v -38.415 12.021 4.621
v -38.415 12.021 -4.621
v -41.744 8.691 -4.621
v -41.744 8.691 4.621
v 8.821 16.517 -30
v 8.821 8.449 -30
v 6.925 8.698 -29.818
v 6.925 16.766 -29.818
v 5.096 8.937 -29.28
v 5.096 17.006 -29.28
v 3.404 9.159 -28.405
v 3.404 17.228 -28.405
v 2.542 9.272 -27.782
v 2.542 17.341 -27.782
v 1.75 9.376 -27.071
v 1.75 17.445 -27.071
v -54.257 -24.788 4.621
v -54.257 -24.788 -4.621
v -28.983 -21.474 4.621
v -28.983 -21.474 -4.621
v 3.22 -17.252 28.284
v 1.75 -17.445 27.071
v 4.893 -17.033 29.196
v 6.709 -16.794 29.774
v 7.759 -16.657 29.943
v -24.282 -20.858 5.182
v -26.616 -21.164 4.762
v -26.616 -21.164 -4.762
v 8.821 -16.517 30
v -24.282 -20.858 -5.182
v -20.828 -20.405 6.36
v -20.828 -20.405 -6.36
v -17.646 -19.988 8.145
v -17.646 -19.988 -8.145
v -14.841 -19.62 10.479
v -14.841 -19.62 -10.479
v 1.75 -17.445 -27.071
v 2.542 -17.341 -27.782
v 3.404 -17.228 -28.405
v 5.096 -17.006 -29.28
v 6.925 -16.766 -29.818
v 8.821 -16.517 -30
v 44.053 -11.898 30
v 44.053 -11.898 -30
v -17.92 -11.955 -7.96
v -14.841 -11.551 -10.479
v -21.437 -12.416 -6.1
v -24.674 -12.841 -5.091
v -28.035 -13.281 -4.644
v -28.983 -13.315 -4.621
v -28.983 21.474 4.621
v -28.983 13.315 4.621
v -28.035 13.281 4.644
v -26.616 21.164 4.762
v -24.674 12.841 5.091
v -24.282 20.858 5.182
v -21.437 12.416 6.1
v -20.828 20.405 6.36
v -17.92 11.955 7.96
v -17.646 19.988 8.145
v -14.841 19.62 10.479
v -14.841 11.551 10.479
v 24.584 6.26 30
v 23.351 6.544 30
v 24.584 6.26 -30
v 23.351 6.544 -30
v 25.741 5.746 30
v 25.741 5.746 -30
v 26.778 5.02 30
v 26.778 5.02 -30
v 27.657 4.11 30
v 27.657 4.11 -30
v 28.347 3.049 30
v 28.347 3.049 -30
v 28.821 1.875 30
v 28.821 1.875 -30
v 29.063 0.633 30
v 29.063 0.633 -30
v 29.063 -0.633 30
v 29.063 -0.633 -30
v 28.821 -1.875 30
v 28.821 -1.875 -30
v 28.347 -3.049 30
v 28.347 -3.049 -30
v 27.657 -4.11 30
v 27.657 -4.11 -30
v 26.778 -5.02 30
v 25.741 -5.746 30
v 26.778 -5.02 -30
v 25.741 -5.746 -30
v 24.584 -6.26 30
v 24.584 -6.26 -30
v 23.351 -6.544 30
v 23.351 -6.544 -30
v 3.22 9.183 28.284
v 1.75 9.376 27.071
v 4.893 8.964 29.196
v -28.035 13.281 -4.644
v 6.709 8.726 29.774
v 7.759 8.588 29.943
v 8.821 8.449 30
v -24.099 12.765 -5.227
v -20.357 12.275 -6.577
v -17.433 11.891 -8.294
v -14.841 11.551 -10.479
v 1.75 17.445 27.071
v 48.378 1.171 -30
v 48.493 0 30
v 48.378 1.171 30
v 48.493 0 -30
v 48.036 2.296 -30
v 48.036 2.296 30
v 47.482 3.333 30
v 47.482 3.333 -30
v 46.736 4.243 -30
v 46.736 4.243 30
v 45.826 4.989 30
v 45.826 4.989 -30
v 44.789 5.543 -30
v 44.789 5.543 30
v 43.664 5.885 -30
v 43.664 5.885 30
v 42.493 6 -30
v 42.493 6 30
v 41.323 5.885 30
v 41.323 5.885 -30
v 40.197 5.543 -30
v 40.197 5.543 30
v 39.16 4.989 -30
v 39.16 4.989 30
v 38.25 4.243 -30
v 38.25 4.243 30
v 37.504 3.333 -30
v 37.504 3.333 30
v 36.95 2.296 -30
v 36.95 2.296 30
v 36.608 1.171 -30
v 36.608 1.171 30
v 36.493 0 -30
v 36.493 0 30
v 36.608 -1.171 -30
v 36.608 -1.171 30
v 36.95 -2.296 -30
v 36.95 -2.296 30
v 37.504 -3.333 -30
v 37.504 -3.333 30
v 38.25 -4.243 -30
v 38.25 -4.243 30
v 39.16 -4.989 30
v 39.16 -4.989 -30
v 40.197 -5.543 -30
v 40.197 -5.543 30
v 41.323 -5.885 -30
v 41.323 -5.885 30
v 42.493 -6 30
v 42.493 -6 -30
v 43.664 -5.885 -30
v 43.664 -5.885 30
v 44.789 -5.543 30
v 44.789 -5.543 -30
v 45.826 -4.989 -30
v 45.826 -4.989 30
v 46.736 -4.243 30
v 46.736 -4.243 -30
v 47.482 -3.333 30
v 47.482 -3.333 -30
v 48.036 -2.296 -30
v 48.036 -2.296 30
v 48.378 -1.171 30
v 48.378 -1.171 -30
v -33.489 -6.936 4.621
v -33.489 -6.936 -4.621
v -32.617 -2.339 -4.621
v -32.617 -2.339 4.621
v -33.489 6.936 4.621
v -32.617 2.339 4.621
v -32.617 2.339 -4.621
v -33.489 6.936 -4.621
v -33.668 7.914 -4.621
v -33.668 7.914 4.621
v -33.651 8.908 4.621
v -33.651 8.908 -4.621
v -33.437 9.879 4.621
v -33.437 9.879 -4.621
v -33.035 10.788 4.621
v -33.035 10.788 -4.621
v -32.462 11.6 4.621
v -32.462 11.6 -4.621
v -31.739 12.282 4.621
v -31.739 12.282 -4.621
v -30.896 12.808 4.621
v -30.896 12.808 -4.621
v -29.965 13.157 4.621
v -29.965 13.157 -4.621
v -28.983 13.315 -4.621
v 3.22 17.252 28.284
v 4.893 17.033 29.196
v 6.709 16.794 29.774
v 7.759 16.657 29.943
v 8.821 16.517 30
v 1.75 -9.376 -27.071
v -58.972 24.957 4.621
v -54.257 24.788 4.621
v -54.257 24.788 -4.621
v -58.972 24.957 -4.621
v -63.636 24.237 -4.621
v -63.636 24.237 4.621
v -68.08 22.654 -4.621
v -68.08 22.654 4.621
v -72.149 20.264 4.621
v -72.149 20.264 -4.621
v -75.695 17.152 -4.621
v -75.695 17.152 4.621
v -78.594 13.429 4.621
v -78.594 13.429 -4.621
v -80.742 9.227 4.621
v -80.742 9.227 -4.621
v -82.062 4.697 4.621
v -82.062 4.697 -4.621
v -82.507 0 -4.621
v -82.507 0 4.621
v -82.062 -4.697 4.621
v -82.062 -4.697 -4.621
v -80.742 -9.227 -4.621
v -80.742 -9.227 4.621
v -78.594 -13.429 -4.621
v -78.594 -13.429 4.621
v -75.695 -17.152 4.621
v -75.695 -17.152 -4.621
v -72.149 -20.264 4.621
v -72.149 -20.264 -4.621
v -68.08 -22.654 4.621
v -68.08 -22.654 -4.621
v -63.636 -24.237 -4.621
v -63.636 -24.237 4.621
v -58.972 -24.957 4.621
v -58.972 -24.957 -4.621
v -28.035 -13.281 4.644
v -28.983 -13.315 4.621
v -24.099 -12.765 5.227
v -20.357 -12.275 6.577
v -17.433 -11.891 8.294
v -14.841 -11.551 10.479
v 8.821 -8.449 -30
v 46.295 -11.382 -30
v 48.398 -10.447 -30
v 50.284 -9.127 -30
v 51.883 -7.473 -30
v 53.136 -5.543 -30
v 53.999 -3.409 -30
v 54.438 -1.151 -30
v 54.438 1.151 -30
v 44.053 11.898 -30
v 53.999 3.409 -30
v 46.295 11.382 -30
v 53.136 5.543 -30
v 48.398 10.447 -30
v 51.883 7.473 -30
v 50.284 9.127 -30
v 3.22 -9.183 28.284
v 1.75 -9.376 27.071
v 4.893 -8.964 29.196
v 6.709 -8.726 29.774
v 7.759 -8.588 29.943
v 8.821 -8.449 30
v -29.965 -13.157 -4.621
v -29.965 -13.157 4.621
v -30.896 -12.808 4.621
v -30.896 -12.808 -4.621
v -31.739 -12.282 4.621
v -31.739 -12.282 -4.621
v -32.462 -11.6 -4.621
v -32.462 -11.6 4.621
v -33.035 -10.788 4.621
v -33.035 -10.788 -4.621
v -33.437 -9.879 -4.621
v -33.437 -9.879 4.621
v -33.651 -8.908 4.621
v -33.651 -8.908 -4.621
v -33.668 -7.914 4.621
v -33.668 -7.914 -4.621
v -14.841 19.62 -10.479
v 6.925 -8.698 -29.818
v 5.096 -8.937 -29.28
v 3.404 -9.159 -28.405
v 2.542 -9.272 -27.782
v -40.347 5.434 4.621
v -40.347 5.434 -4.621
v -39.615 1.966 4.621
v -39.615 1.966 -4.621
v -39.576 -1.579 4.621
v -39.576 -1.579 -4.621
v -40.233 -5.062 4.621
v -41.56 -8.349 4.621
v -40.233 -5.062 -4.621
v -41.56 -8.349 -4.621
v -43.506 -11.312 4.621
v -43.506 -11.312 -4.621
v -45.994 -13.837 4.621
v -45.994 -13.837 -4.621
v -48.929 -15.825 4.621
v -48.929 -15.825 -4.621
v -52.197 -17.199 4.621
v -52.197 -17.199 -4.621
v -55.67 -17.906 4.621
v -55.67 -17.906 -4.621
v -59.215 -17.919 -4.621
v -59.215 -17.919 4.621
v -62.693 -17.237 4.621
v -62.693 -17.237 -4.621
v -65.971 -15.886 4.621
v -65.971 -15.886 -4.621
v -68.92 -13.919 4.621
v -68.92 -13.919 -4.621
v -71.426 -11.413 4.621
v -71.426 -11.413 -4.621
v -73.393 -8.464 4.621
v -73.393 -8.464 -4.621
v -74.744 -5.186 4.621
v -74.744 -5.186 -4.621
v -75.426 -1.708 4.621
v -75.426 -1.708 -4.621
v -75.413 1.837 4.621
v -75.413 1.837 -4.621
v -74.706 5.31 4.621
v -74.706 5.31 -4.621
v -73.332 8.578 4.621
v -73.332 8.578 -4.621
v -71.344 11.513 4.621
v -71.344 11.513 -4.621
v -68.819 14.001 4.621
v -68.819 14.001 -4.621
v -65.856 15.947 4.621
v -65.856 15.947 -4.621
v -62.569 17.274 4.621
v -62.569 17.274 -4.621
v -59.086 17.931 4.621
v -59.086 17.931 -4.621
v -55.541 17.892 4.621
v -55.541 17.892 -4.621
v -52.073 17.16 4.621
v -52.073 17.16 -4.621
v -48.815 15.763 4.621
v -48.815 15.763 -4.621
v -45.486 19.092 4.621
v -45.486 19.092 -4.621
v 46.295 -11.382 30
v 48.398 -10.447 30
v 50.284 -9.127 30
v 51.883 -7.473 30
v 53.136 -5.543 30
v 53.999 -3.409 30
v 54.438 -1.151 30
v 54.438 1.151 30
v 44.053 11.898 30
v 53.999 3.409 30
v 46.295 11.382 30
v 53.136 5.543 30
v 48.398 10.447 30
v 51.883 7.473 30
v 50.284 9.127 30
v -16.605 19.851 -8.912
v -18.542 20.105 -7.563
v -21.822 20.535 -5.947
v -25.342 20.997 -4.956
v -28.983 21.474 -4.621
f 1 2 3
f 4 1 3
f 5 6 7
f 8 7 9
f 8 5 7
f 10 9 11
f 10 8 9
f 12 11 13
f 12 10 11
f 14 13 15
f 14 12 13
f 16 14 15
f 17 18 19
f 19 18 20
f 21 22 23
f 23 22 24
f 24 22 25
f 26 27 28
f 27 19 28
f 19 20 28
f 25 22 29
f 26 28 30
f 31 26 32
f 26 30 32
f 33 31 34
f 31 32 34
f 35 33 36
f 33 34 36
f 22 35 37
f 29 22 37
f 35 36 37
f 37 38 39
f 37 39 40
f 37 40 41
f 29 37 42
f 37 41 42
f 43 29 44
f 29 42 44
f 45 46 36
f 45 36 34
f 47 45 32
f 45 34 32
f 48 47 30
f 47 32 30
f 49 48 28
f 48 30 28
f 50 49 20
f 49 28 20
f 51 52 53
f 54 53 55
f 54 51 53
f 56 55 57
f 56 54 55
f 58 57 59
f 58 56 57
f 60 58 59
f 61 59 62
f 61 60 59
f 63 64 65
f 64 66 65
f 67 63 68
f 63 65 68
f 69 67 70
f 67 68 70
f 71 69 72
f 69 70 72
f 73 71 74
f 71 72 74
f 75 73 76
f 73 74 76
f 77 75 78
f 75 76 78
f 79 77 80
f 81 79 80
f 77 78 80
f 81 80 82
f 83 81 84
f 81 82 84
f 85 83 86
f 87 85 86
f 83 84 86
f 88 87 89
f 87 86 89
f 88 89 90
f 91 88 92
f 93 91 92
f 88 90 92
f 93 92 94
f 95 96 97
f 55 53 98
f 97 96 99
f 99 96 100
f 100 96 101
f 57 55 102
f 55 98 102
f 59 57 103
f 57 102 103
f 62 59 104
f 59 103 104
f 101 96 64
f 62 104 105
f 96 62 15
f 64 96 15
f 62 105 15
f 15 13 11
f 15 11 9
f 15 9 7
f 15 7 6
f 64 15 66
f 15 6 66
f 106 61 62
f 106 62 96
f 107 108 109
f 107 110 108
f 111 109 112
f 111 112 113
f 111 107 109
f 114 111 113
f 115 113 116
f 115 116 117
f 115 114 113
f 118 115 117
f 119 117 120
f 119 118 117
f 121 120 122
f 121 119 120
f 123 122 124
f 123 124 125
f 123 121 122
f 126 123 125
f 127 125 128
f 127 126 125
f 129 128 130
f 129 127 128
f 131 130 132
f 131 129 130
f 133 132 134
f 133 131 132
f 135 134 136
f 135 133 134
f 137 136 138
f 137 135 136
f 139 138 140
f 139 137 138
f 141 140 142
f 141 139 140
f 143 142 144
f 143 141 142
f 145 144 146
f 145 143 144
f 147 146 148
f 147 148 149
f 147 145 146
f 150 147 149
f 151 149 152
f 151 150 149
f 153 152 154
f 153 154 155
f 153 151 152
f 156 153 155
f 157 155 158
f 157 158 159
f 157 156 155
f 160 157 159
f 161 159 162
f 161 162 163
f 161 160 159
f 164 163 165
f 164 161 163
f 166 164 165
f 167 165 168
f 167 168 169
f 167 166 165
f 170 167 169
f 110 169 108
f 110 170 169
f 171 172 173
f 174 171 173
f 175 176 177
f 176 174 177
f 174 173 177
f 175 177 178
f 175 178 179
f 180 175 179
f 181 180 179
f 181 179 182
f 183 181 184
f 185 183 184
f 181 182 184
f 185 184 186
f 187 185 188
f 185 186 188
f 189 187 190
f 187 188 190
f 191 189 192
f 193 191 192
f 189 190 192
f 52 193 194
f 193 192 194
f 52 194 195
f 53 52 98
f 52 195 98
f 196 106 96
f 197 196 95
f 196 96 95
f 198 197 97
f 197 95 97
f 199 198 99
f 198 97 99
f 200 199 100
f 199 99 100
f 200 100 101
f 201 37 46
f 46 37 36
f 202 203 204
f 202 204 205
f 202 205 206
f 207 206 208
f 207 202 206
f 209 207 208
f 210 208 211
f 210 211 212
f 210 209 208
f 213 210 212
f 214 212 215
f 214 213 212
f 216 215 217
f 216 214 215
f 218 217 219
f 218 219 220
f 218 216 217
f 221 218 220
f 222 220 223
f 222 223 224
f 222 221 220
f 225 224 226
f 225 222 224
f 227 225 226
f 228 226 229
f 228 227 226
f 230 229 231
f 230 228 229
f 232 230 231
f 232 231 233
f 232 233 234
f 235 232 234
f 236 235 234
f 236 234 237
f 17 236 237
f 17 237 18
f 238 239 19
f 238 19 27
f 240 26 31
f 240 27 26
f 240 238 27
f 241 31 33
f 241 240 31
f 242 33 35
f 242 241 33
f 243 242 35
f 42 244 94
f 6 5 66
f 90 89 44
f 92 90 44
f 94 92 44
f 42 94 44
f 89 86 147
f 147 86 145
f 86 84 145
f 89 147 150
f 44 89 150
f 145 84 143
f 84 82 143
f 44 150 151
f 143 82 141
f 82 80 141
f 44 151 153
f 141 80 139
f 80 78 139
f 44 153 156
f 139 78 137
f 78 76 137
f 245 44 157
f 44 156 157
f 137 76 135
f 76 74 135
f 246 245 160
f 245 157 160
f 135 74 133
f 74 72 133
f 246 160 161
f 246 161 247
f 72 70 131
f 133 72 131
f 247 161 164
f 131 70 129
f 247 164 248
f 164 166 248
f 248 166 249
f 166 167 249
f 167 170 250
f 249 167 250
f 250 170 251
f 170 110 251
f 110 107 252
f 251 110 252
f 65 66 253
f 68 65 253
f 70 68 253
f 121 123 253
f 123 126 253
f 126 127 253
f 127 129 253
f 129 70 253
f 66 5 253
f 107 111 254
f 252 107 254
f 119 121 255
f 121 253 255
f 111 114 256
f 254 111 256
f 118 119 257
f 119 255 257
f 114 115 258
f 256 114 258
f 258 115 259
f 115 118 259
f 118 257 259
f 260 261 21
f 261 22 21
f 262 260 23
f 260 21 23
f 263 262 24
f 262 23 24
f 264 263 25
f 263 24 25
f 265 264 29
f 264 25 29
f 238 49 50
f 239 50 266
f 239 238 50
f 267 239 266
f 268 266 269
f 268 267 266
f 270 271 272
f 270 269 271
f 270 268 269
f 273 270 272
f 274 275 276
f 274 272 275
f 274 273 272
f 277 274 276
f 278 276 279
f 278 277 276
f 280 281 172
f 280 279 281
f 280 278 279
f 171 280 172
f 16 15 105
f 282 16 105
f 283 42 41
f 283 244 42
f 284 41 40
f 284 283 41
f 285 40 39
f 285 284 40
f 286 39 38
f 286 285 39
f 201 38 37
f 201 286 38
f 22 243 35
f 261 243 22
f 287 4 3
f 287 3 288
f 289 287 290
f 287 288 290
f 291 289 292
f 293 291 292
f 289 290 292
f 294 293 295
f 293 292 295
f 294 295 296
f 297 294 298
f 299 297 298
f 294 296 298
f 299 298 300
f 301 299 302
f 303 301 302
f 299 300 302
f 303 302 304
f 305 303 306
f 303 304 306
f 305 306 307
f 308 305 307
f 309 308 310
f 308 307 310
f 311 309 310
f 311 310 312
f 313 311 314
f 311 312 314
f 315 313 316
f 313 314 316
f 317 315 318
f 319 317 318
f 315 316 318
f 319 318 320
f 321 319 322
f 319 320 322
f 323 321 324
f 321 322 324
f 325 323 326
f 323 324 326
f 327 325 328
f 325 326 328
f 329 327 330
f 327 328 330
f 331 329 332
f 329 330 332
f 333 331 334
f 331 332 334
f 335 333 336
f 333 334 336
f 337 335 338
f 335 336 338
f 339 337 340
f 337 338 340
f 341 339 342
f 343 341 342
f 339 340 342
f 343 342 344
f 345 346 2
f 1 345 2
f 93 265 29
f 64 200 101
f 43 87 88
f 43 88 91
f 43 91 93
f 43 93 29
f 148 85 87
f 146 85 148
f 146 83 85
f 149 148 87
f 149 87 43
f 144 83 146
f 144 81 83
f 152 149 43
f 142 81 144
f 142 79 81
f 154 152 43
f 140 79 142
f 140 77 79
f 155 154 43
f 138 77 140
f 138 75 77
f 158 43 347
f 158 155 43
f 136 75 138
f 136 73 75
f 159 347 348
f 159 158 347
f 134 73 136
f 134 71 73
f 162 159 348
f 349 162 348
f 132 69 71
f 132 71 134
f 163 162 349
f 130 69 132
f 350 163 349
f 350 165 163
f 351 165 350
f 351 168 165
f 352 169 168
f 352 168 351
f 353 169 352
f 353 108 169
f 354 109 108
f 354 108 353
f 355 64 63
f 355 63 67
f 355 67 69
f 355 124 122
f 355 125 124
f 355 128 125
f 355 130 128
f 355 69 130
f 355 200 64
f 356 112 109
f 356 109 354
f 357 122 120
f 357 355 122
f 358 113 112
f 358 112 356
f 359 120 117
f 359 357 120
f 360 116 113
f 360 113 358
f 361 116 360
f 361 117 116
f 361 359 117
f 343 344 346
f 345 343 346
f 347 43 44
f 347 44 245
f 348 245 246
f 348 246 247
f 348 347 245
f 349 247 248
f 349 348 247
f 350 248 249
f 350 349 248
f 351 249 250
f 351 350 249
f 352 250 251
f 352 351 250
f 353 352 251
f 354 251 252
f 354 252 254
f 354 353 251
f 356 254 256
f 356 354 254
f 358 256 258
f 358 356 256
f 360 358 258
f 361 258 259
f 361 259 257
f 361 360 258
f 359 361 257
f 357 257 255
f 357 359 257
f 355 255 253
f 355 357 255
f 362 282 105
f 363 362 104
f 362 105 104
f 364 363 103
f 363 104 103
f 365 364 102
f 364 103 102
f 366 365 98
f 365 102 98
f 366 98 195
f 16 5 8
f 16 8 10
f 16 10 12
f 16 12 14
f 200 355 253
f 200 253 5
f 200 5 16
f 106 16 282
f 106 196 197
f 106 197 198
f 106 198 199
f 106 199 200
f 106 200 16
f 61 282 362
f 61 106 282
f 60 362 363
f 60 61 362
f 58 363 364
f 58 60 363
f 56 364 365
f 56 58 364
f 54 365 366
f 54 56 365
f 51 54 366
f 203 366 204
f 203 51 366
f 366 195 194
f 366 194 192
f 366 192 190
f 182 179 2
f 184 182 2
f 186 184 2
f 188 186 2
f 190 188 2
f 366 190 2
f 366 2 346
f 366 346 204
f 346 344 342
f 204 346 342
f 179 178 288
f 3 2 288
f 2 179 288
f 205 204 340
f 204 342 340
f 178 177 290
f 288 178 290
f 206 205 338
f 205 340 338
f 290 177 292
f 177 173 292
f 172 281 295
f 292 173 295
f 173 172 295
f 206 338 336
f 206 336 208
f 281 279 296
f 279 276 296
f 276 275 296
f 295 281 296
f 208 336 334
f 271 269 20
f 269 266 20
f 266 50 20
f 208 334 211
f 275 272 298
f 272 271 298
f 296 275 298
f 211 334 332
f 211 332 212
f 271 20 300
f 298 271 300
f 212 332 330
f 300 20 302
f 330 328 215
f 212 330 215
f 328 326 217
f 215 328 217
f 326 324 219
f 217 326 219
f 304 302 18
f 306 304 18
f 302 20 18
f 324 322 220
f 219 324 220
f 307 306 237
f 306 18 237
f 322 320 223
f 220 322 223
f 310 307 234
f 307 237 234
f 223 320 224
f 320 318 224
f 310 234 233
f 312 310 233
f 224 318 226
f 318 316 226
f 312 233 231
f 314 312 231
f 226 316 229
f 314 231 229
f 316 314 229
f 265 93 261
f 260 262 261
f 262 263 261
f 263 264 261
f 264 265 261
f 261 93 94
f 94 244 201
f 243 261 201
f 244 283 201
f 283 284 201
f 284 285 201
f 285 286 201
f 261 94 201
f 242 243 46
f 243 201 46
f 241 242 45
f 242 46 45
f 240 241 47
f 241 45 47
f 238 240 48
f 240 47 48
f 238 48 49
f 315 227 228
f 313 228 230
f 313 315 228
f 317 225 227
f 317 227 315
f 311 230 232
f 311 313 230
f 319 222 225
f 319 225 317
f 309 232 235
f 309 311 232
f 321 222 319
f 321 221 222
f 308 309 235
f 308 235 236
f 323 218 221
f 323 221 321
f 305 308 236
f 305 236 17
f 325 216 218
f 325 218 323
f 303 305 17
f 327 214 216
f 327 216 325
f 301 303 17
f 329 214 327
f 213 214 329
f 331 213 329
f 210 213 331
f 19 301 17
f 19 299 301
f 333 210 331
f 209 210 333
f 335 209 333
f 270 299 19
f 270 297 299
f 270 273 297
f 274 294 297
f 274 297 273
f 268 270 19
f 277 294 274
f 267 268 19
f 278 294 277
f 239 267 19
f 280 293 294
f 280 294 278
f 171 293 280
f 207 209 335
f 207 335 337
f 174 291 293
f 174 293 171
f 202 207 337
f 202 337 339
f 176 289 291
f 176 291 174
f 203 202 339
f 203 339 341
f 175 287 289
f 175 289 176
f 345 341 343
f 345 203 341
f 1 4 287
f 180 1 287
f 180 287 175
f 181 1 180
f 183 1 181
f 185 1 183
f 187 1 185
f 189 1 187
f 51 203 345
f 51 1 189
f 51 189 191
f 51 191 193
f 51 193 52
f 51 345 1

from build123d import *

# Parameters (mm, degrees)
SKETCH1_R           = 12
SKETCH1_R_2         = 6
BOSS_EXTRUDE1_DEPTH = 30
CUT_EXTRUDE1_DEPTH  = 30
FILLET1_R           = 10


with BuildPart() as part:
    # Sketch1 → Boss-Extrude1 (new, symmetric)
    # profile 1 of 2: a face of its own
    with BuildSketch(Plane.XY):
        with BuildLine():
            Line((44.05305559, 11.898167926), (-54.25694441, 24.787849846))
            ThreePointArc((-54.25694441, 24.787849846), (-82.50694441, 0), (-54.25694441, -24.787849846))
            Line((-54.25694441, -24.787849846), (44.05305559, -11.898167926))
            ThreePointArc((44.05305559, -11.898167926), (30.49305559, 0), (44.05305559, 11.898167926))
        make_face()
        with BuildLine():
            ThreePointArc((-33.488504763, 6.936465737), (-32.476597793, 11.582960804), (-28.034816833, 13.281328853))
            Line((-28.034816833, 13.281328853), (23.35105559, 6.543992359))
            ThreePointArc((23.35105559, 6.543992359), (29.09305559, 0), (23.35105559, -6.543992359))
            Line((23.35105559, -6.543992359), (-28.034816833, -13.281328853))
            ThreePointArc((-28.034816833, -13.281328853), (-32.476597793, -11.582960804), (-33.488504763, -6.936465737))
            ThreePointArc((-33.488504763, -6.936465737), (-32.50694441, 0), (-33.488504763, 6.936465737))
        make_face(mode=Mode.SUBTRACT)
        with BuildLine():
            ThreePointArc((-41.744391243, 8.691485355), (-70.234866471, -12.727922061), (-48.815459055, 15.762553167))
            Line((-48.815459055, 15.762553167), (-45.48612913, 19.091883092))
            Line((-45.48612913, 19.091883092), (-38.415061318, 12.02081528))
            Line((-38.415061318, 12.02081528), (-41.744391243, 8.691485355))
        make_face(mode=Mode.SUBTRACT)
    # profile 2 of 2: a face of its own
    with BuildSketch(Plane.XY):
        with Locations((42.49305559, 0)):
            Circle(SKETCH1_R)
        with Locations((42.49305559, 0)):
            Circle(SKETCH1_R_2, mode=Mode.SUBTRACT)
    extrude(amount=BOSS_EXTRUDE1_DEPTH, both=True)

    # Sketch5 → Cut-Extrude1 (cut, symmetric)
    with BuildSketch(Plane(origin=(0, 0, 0), x_dir=(1, 0, 0), z_dir=(0, 1, 0))):
        with BuildLine():
            ThreePointArc((-14.84129936, 10.479353549), (-21.329766336, 6.143898522), (-28.983434984, 4.621489173))
            Line((-28.983434984, 4.621489173), (-82.50694441, 4.621489173))
            Line((-82.50694441, 4.621489173), (-82.50694441, 30))
            Line((-82.50694441, 30), (4.679347091, 30))
            Line((4.679347091, 30), (-14.84129936, 10.479353549))
        make_face()
        with BuildLine():
            ThreePointArc((-28.983434984, -4.621489173), (-21.329766336, -6.143898522), (-14.84129936, -10.479353549))
            Line((-14.84129936, -10.479353549), (4.679347091, -30))
            Line((4.679347091, -30), (-82.50694441, -30))
            Line((-82.50694441, -30), (-82.50694441, -4.621489173))
            Line((-82.50694441, -4.621489173), (-28.983434984, -4.621489173))
        make_face()
    extrude(amount=CUT_EXTRUDE1_DEPTH, both=True, mode=Mode.SUBTRACT)

    # Fillet1
    fillet1_edges = [part.edges().sort_by_distance(p)[0] for p in [
        (4.679347091, 13.026323567, -30),
        (4.679347091, -13.026323567, -30),
        (4.679347091, -13.026323567, 30),
        (4.679347091, 13.026323567, 30),
    ]]
    fillet(fillet1_edges, radius=FILLET1_R)


solid = part.part
